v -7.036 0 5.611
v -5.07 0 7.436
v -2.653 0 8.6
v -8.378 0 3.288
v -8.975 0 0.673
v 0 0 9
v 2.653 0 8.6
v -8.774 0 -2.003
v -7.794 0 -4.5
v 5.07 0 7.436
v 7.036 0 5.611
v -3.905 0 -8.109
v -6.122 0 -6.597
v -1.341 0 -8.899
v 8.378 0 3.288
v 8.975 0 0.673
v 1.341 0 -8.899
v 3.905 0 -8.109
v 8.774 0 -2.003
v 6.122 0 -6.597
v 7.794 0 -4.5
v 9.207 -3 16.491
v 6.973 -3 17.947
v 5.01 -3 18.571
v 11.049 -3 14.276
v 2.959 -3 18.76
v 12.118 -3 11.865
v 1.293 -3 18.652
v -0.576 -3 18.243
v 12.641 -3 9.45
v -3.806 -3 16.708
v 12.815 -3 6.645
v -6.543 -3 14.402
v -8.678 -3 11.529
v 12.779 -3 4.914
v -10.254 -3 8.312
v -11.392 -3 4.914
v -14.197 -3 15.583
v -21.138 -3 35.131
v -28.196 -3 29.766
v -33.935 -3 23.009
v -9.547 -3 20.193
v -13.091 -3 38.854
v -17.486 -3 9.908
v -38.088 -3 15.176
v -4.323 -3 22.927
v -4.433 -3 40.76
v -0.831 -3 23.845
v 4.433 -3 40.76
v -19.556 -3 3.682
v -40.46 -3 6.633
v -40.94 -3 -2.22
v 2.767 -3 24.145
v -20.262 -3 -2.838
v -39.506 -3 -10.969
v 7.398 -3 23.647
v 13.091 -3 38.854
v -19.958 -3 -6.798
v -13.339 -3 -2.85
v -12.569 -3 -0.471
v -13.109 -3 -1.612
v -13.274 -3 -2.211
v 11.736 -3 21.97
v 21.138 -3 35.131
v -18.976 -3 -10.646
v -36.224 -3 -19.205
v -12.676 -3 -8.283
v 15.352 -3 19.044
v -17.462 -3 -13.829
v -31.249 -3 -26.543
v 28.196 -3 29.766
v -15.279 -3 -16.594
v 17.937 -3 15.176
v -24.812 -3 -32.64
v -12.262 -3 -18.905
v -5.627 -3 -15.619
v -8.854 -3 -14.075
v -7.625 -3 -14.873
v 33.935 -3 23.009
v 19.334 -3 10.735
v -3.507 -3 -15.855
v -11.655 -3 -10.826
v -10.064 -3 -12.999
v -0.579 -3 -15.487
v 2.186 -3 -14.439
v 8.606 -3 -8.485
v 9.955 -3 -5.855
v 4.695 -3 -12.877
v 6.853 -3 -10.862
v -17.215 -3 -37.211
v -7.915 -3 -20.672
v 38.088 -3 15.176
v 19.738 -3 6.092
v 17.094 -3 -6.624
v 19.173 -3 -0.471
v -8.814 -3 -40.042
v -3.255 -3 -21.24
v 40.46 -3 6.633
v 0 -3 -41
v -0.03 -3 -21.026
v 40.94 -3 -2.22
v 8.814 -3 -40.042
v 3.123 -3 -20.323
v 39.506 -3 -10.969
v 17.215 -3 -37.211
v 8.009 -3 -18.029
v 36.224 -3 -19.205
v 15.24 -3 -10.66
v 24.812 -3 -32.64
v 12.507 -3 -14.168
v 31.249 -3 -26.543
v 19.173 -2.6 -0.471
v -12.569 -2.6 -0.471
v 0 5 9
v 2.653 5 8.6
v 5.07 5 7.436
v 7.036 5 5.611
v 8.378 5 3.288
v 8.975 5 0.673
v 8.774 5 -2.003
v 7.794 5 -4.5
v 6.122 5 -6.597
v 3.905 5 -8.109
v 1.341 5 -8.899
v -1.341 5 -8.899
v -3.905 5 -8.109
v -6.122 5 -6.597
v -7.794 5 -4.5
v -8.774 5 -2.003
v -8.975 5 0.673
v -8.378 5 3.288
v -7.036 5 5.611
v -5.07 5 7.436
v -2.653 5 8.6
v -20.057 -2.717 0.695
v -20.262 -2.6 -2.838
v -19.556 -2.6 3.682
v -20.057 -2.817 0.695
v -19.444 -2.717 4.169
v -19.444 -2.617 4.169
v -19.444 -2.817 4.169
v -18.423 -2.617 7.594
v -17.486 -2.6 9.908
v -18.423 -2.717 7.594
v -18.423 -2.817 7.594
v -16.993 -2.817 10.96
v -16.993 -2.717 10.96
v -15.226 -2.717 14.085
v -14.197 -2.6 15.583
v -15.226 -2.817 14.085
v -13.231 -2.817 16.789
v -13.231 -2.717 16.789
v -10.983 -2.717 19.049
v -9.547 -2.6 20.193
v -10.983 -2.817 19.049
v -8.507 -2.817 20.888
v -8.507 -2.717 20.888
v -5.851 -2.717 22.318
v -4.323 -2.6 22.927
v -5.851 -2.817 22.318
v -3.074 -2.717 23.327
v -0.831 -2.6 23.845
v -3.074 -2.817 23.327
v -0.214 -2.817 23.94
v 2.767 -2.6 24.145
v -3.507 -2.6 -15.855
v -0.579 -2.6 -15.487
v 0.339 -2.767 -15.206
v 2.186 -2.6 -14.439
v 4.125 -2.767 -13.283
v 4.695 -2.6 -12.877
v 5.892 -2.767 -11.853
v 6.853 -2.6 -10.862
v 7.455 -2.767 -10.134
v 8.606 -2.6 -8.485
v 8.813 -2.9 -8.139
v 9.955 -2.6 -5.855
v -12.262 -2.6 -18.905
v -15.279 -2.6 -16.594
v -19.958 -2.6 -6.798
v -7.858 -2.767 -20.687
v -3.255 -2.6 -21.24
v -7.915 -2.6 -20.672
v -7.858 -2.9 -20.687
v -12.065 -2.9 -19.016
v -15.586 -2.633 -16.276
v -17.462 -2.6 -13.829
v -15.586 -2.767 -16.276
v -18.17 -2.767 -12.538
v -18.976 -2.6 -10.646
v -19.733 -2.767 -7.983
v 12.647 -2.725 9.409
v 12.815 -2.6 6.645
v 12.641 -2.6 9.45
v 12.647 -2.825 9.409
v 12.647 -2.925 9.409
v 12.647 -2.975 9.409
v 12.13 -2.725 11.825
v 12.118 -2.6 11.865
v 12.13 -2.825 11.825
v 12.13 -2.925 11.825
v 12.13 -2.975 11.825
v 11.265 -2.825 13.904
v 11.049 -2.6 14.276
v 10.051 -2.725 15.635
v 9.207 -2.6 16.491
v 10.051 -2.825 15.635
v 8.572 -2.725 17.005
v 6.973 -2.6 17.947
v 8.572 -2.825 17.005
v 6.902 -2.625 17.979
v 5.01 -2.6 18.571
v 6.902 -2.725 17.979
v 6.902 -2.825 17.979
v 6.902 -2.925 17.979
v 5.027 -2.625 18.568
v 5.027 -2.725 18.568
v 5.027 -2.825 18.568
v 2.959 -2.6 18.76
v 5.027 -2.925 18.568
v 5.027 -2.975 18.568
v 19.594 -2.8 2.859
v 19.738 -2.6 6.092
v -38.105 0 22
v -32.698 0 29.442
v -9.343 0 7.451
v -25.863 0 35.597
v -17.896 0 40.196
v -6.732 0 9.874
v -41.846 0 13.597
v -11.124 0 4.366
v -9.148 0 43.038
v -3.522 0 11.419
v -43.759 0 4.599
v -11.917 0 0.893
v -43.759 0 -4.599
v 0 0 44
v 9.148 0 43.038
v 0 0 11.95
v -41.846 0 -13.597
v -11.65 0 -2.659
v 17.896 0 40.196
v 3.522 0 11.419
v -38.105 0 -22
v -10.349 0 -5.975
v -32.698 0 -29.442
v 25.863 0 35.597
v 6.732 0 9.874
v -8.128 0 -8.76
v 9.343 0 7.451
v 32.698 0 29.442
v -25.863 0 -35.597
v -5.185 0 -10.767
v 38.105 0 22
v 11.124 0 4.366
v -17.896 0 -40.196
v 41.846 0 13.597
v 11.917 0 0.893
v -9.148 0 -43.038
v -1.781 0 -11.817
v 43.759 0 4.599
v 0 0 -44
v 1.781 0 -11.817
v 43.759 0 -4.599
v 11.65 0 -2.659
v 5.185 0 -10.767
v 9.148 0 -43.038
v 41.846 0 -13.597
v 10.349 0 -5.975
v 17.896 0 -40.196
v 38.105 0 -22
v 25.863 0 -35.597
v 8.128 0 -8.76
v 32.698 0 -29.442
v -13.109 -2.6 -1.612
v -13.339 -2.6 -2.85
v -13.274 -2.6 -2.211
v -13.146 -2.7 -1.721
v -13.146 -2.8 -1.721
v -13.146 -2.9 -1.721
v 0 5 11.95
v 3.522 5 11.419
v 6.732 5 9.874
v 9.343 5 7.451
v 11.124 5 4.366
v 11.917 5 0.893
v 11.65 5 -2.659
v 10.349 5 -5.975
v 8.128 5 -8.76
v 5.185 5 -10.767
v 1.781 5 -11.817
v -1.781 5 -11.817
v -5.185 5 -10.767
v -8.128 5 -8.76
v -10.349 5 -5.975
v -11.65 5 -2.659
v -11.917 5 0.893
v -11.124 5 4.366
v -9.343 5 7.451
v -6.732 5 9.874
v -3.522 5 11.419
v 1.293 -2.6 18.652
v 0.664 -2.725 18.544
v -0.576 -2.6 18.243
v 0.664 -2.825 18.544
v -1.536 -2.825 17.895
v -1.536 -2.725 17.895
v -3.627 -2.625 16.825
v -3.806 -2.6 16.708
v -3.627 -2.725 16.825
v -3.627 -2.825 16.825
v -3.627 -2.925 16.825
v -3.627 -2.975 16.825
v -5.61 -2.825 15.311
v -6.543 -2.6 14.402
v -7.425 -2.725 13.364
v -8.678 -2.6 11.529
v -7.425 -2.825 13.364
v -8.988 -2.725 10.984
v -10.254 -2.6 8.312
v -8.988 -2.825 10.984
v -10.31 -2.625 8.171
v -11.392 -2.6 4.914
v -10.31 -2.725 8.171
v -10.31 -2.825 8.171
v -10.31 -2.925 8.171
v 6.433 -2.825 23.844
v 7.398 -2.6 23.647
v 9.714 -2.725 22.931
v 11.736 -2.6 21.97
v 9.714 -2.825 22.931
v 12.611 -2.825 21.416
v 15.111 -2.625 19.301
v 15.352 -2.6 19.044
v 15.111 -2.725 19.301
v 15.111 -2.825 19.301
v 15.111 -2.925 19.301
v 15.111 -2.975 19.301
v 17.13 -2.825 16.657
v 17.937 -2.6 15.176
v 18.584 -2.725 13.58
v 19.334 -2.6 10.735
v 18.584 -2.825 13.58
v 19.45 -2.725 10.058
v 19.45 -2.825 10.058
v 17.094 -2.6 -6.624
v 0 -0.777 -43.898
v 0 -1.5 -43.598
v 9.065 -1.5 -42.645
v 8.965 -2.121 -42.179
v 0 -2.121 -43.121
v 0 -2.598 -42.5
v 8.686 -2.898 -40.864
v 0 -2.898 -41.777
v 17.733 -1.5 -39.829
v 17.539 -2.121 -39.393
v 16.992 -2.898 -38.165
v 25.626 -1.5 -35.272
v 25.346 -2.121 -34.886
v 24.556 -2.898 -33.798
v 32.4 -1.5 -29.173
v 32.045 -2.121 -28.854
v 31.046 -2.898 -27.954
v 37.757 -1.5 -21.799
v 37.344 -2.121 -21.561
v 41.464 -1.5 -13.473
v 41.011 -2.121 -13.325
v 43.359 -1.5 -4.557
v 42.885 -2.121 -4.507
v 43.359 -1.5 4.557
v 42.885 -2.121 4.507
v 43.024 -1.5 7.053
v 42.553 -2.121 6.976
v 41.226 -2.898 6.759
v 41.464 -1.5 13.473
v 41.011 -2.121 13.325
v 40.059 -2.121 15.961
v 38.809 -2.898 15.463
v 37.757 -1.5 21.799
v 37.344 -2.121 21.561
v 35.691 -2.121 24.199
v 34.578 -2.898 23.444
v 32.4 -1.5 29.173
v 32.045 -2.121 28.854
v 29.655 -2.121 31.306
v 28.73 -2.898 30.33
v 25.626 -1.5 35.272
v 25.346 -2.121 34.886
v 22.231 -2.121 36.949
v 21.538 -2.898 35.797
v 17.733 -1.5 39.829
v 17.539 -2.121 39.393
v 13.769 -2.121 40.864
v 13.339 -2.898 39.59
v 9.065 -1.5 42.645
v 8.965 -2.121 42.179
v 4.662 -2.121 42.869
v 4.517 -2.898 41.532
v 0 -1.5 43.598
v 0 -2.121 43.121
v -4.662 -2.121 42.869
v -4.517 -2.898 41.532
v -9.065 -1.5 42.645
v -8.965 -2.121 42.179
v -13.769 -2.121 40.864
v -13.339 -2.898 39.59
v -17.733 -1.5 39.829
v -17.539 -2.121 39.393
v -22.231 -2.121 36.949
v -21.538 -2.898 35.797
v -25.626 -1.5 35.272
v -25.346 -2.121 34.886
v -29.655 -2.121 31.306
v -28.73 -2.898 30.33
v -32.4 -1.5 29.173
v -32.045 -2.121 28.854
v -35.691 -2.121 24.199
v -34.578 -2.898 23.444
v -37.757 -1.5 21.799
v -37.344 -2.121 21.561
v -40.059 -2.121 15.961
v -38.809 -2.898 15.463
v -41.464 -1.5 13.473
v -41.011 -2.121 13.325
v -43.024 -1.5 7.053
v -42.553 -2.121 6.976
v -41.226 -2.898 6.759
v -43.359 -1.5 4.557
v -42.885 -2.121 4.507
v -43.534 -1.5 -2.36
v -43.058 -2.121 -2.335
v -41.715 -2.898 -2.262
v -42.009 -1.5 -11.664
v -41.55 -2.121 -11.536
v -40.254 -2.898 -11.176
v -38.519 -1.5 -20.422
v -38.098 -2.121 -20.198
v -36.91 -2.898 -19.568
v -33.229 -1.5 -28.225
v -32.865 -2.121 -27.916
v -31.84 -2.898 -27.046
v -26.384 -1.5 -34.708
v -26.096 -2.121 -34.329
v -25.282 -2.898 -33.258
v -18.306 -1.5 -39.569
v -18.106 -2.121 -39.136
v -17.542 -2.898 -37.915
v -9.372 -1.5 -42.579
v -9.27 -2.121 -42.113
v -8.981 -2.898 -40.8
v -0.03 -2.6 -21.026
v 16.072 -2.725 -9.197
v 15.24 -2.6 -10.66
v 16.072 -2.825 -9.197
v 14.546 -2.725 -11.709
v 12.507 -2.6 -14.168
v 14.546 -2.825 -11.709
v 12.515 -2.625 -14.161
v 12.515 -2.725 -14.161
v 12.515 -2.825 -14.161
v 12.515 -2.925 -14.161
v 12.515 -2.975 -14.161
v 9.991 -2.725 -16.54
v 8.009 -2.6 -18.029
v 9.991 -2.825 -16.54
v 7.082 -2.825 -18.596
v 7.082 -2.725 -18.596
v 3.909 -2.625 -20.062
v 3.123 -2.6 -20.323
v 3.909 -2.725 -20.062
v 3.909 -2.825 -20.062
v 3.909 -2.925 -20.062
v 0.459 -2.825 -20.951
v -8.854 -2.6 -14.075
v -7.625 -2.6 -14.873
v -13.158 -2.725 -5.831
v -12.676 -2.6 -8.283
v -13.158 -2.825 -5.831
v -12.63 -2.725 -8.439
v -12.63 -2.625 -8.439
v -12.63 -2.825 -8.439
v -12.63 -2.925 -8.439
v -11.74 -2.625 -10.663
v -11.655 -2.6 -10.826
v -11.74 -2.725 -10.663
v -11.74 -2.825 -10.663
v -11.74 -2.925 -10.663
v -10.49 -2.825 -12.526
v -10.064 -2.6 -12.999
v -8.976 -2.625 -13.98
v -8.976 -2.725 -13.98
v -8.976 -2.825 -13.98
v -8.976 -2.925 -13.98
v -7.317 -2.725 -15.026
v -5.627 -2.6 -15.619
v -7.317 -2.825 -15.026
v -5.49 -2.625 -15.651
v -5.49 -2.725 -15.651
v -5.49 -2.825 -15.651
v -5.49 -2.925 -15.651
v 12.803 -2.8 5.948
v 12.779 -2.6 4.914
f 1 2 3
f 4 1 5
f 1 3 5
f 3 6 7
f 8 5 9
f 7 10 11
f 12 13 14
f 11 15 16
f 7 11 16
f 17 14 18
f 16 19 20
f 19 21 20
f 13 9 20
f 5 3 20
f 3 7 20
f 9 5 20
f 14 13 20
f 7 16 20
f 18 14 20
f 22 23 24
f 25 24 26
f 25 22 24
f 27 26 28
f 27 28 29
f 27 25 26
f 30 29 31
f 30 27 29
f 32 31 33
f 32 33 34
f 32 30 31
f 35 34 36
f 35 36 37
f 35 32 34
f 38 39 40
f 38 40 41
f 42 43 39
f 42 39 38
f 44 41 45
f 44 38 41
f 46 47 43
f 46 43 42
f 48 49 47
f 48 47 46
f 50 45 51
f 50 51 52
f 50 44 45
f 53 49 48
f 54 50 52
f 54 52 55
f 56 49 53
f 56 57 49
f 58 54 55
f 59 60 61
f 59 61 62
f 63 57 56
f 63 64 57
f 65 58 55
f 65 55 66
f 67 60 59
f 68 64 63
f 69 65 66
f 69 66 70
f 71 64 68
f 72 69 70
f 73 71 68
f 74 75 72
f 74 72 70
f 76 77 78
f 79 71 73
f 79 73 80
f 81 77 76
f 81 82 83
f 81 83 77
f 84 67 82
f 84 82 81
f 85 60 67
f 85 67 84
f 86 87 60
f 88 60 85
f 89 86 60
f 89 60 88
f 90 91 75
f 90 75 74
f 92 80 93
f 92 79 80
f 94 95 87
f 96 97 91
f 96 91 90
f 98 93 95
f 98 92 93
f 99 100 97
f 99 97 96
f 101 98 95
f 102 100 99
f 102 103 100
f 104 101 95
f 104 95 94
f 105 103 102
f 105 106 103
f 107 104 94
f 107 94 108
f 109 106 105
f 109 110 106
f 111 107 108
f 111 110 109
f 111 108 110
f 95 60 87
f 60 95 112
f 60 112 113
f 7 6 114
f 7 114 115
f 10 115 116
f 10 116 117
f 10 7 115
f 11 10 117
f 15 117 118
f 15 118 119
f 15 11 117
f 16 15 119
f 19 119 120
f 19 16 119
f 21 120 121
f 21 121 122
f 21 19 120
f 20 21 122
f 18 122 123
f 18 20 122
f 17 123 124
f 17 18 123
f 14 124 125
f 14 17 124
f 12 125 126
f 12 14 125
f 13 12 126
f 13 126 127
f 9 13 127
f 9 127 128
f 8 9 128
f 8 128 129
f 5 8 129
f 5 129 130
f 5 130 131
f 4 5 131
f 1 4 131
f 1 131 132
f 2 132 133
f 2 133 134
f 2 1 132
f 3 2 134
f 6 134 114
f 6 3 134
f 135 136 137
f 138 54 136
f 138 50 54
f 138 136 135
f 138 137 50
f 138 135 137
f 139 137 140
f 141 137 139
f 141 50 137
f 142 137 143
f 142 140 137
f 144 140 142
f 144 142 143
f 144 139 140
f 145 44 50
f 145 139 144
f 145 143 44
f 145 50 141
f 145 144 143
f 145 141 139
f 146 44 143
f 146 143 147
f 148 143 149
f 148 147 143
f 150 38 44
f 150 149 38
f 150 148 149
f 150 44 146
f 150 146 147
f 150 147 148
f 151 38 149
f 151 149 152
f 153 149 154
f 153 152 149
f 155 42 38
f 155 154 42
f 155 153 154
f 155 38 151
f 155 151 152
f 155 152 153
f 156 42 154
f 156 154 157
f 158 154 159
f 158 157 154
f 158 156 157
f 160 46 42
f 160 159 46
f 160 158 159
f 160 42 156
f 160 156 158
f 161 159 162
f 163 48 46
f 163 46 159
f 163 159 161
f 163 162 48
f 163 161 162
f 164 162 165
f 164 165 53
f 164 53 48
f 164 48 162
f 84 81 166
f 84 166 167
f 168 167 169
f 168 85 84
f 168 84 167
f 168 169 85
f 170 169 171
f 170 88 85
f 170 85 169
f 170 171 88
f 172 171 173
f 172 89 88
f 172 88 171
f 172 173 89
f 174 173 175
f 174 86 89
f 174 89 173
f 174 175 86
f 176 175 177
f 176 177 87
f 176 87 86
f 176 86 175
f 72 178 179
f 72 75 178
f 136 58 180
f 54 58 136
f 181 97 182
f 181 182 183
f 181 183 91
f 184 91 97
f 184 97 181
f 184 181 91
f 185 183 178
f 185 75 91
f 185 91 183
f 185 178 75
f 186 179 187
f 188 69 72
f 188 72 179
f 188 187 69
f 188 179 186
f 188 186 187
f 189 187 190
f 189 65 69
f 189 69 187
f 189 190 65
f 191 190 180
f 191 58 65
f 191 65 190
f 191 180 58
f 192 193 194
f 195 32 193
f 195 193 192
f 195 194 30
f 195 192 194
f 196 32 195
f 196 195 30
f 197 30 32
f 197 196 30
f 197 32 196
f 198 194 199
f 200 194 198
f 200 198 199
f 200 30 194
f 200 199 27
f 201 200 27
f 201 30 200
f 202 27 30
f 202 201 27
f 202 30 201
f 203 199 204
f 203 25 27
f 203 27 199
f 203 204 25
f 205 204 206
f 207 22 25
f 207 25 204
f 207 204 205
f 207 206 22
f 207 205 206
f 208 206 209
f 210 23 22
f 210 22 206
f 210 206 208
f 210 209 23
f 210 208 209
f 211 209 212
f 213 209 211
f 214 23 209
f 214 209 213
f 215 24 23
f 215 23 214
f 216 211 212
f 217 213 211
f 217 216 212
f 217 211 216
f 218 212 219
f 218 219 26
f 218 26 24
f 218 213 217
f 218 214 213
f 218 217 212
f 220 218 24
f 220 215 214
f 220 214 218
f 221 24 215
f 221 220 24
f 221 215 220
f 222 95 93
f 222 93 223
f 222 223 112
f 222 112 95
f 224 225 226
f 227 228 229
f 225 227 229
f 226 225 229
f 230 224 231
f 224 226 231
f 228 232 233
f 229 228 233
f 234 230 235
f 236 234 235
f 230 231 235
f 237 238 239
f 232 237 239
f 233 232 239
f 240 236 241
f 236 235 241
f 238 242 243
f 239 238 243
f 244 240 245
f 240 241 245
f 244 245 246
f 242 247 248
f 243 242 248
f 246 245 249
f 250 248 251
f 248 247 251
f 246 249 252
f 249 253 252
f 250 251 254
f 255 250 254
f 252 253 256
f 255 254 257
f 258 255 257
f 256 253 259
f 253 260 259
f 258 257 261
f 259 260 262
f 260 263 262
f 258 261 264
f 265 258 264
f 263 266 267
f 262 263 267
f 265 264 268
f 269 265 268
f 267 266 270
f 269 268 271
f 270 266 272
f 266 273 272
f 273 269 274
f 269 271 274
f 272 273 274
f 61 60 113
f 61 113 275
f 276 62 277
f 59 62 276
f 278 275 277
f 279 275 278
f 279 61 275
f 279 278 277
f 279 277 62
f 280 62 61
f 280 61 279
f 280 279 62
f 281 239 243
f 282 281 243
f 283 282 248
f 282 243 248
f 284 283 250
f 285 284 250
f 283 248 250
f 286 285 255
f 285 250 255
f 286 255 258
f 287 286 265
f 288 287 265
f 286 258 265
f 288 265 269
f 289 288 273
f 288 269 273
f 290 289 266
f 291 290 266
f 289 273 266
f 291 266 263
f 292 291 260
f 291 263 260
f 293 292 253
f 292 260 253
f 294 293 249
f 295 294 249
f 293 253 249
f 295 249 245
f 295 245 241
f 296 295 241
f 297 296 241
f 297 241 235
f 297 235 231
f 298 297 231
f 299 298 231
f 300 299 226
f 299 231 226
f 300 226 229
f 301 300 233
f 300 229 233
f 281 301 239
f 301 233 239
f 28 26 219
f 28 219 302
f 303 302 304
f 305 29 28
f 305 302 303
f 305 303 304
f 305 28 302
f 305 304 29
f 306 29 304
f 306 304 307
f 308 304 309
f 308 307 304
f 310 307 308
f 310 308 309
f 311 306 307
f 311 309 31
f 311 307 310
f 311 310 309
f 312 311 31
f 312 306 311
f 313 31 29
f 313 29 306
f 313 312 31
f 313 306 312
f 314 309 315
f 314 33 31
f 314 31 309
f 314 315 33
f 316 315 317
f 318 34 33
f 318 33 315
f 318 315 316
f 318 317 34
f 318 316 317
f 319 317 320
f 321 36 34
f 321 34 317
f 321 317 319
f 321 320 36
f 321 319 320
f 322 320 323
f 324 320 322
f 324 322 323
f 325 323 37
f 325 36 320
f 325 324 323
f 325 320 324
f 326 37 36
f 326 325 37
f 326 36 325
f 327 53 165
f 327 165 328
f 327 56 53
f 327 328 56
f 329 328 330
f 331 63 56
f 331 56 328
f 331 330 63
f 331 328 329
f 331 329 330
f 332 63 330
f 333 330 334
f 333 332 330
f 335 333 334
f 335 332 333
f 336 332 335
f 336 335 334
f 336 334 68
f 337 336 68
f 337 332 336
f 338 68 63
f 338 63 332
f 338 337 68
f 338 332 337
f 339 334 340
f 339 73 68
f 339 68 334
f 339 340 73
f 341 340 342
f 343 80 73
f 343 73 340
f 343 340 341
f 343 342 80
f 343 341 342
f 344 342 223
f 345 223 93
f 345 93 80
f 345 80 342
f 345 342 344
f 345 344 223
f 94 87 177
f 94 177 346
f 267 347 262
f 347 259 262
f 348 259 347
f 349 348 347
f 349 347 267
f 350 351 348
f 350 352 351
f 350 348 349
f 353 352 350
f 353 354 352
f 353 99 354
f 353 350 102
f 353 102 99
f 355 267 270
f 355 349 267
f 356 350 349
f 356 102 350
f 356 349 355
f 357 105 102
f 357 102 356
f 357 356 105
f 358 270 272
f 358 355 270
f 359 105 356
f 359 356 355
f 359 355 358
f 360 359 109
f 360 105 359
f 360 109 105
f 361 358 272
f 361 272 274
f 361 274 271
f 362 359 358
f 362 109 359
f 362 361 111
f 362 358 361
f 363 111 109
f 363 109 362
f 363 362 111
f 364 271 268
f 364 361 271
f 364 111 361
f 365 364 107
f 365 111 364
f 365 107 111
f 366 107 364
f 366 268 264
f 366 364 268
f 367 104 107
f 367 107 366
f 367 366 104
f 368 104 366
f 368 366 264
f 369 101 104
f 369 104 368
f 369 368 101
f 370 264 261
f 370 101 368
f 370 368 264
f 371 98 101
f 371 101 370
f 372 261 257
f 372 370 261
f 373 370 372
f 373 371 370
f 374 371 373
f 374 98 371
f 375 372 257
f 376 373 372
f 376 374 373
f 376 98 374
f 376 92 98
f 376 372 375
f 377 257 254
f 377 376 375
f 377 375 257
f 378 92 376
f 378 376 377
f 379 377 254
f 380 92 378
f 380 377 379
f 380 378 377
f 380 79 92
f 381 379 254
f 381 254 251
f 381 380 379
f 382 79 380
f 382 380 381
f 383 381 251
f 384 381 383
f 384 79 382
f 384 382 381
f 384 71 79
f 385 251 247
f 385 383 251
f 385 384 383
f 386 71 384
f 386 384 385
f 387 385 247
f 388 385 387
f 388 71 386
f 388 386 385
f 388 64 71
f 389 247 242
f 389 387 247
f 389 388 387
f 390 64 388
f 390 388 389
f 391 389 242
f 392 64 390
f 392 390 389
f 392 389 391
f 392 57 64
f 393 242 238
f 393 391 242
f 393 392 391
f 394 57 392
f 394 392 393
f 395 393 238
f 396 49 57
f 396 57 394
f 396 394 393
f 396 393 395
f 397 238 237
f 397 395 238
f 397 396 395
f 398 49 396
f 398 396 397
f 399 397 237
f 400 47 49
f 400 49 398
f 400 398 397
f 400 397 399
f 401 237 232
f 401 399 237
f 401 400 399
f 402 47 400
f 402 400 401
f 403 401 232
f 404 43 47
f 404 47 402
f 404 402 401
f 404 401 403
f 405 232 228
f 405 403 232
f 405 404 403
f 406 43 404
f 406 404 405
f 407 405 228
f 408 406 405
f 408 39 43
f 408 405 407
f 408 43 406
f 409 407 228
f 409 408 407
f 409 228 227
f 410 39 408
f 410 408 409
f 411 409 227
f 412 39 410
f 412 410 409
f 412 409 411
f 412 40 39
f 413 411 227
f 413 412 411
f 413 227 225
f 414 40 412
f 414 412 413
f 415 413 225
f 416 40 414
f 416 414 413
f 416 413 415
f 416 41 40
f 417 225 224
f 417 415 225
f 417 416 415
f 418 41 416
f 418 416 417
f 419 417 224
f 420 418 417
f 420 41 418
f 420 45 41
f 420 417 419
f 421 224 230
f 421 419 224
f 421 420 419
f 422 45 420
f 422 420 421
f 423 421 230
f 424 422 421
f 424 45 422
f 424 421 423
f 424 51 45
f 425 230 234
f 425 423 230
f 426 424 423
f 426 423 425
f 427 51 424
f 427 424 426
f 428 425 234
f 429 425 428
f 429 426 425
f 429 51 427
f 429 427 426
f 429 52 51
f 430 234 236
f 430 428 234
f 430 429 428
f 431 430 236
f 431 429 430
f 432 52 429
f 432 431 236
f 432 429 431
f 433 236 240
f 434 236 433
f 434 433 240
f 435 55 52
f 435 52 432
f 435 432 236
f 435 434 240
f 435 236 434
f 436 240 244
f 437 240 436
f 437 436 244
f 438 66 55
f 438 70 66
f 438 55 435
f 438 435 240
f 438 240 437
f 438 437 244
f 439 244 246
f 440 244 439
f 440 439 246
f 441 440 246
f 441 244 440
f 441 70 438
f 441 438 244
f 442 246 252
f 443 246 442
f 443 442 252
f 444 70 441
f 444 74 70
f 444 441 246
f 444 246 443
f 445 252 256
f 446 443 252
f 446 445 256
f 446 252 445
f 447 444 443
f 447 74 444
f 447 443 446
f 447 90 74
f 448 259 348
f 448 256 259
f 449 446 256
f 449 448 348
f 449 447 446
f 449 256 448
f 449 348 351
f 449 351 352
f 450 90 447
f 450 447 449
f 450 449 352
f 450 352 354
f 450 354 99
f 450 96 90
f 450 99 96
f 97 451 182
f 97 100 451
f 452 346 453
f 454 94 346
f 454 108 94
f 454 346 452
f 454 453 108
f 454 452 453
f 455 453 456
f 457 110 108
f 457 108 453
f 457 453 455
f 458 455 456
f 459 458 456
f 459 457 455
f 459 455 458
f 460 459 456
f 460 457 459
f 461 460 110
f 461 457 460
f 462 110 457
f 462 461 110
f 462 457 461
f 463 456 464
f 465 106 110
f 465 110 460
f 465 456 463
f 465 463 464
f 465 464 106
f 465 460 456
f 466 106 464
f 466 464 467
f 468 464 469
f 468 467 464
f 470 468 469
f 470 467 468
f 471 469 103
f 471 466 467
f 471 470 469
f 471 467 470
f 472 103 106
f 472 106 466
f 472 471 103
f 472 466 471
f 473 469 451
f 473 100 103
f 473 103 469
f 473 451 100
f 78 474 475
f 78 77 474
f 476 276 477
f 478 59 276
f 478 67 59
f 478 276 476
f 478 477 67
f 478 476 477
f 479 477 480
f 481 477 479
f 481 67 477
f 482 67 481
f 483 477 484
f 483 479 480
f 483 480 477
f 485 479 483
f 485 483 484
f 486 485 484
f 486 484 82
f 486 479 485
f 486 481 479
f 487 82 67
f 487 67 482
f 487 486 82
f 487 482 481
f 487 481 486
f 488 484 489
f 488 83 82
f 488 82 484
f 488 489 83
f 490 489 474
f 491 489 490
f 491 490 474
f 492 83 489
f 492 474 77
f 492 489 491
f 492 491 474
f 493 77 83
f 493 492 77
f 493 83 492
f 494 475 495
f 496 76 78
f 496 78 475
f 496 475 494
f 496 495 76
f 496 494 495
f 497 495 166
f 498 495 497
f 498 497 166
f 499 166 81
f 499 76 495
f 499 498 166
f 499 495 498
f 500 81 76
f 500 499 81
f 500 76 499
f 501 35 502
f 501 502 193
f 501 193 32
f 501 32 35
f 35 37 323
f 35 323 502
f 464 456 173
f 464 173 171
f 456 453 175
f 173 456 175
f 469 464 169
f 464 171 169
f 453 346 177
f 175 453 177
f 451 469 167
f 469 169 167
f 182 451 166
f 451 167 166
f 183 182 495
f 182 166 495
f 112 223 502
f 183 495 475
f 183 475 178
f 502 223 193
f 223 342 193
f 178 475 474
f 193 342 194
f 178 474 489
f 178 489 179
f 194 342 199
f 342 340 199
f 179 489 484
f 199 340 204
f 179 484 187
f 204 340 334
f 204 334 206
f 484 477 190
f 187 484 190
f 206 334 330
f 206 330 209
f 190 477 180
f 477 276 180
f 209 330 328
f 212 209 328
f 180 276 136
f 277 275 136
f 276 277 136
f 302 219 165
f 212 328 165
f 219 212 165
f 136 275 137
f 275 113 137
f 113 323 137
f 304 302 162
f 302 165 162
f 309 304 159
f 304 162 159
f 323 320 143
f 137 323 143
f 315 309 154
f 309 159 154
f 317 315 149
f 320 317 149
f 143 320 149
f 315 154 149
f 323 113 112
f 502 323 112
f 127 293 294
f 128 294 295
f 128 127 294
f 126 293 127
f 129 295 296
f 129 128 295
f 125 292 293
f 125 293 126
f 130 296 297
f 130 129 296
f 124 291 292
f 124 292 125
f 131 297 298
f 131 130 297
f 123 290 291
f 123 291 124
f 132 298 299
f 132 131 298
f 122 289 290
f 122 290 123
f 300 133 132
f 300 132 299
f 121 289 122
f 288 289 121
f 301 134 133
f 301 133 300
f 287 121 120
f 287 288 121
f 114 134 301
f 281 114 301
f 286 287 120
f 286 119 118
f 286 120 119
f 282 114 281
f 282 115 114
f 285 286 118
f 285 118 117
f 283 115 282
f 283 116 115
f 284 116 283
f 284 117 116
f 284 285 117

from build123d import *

# Parameters (mm, degrees)
SKETCH_1_R          = 11.95
SKETCH_1_R_2        = 9
EXTRUDE_1_DEPTH     = 5
SKETCH_2_R          = 44
EXTRUDE_2_DEPTH     = 3
FILLET_1_R          = 3
CUT_EXTRUDE_1_DEPTH = 0.4


with BuildPart() as part:
    # Эскиз1 → Бобышка-Вытянуть1 (new body)
    with BuildSketch(Plane(origin=(0, 0, 0), x_dir=(1, 0, 0), z_dir=(0, 1, 0))):
        with Locations(Location((0, 0, 0), (0, 0, 270))):
            Circle(SKETCH_1_R)
        with Locations(Location((0, 0, 0), (0, 0, 270))):
            Circle(SKETCH_1_R_2, mode=Mode.SUBTRACT)
    extrude(amount=EXTRUDE_1_DEPTH)

    # Эскиз2 → Бобышка-Вытянуть2 (add)
    with BuildSketch(Plane.XZ):
        with Locations(Location((0, 0, 0), (0, 0, 270))):
            Circle(SKETCH_2_R)
    extrude(amount=EXTRUDE_2_DEPTH)

    # Скругление1
    fillet_1_edges = [part.edges().sort_by_distance(p)[0] for p in [
        (0, -3, 44),
    ]]
    fillet(fillet_1_edges, radius=FILLET_1_R - 0.0001)  # a hair under: the kernel refuses the full size

    # Эскиз3 → Вырез-Вытянуть1 (cut)
    with BuildSketch(Plane.XZ.offset(3)):
        with BuildLine():
            Line((9.954559223, -5.855217729), (17.0939823, -6.624448498))
            add(Edge.make_bspline(
                [(17.0939823, -6.624448498), (16.954374573, -7.060364037), (16.67246957, -7.940593052), (16.082570182, -9.220685029), (15.367854468, -10.479237732), (14.549468275, -11.738227045), (13.598128393, -12.976714181), (12.508174471, -14.188327514), (11.307260102, -15.391109491), (9.994571436, -16.559013497), (8.599176625, -17.665541174), (7.097641414, -18.617186253), (5.53477836, -19.420340753), (3.908983058, -20.092788159), (2.213013482, -20.604345047), (0.449135236, -20.981542054), (-1.382110347, -21.198678471), (-2.625007466, -21.22599593), (-3.254575393, -21.239833113)],
                knots=[0, 0, 0, 0, 0.821440156, 1.658705401, 2.525323128, 3.419405186, 4.353419828, 5.32681938, 6.344399772, 7.404443113, 8.481060479, 9.538977106, 10.591299887, 11.633537695, 12.694215778, 13.768160887, 14.869500701, 16, 16, 16, 16], degree=3))
            add(Edge.make_bspline(
                [(-3.254575393, -21.239833113), (-4.037474252, -21.210468003), (-5.585963904, -21.152386976), (-7.859698842, -20.739484748), (-10.031214503, -20.033002378), (-12.082905697, -19.06267493), (-13.983263507, -17.838479622), (-15.628310659, -16.302835445), (-17.068788245, -14.551786811), (-18.226388665, -12.538555624), (-19.140015512, -10.335429034), (-19.780294703, -7.963227163), (-20.191471581, -5.448805692), (-20.238000287, -3.721455618), (-20.261786931, -2.838390806)],
                knots=[0, 0, 0, 0, 0.998551589, 1.975027533, 2.936744805, 3.903838964, 4.863557655, 5.807675034, 6.763178998, 7.745855275, 8.758641806, 9.797744155, 10.874151411, 12, 12, 12, 12], degree=3))
            add(Edge.make_bspline(
                [(-20.261786931, -2.838390806), (-20.253583862, -2.249072754), (-20.237148757, -1.068355571), (-20.071493014, 0.692734171), (-19.824593654, 2.443807008), (-19.457520681, 4.175543157), (-19.00443369, 5.89924412), (-18.436371871, 7.60283942), (-17.771918435, 9.296625216), (-17.009212067, 10.961487215), (-16.169576767, 12.570831605), (-15.246119859, 14.076076683), (-14.290825473, 15.491991281), (-13.257769645, 16.789715189), (-12.155533796, 17.973523587), (-11.00356969, 19.054320976), (-9.797035153, 20.040082521), (-8.518689542, 20.899962793), (-7.204489818, 21.664382583), (-5.862524589, 22.334760878), (-4.485868659, 22.886891815), (-3.083314583, 23.339978114), (-1.660006861, 23.708336607), (-0.208394214, 23.955377865), (1.268817222, 24.120842874), (2.265803014, 24.136773037), (2.767059223, 24.144782271)],
                knots=[0, 0, 0, 0, 1.075906032, 2.155611451, 3.227554832, 4.30373447, 5.38628686, 6.480642286, 7.581143633, 8.707391042, 9.82337293, 10.893692135, 11.930684225, 12.940768785, 13.919223559, 14.881988069, 15.823529777, 16.761054785, 17.692163021, 18.598508727, 19.497917784, 20.397951545, 21.288749041, 22.180057169, 23.084984307, 24, 24, 24, 24], degree=3))
            add(Edge.make_bspline(
                [(2.767059223, 24.144782271), (3.396819449, 24.13271298), (4.624674455, 24.109181262), (6.419415658, 23.873617188), (8.114533072, 23.493780483), (9.71479097, 22.957293415), (11.228369978, 22.293366902), (12.626669407, 21.438368521), (13.932702912, 20.448929523), (15.134462193, 19.318054618), (16.221199996, 18.057248477), (17.152473609, 16.665333162), (17.973572218, 15.181251724), (18.615932964, 13.571276078), (19.12246379, 11.857059969), (19.479861685, 10.030309351), (19.69885311, 8.096457894), (19.72490677, 6.769573083), (19.738213069, 6.091897656)],
                knots=[0, 0, 0, 0, 1.079196217, 2.10412856, 3.097265039, 4.052997914, 4.993829394, 5.924450447, 6.855882321, 7.798592485, 8.748507102, 9.702980304, 10.665060364, 11.651045023, 12.668191174, 13.725659051, 14.838433479, 16, 16, 16, 16], degree=3))
            add(Edge.make_bspline(
                [(19.738213069, 6.091897656), (19.711530906, 5.012347464), (19.657182115, 2.813415932), (19.336536232, 0.637210246), (19.173309223, -0.470602344)],
                knots=[0, 0, 0, 0, 0.981886135, 2, 2, 2, 2], degree=3))
            Line((19.173309223, -0.470602344), (-12.569479239, -0.470602344))
            add(Edge.make_bspline(
                [(-12.569479239, -0.470602344), (-12.686010265, -0.684825825), (-12.905708031, -1.088704703), (-13.155238164, -1.702843602), (-13.305966259, -2.286193686), (-13.328203982, -2.669377879), (-13.338710008, -2.850410037)],
                knots=[0, 0, 0, 0, 1.156942796, 2.181202349, 3.140724307, 4, 4, 4, 4], degree=3))
            add(Edge.make_bspline(
                [(-13.338710008, -2.850410037), (-13.329201362, -3.363533664), (-13.310745354, -4.359491854), (-13.176596758, -5.804983514), (-12.964076928, -7.159922166), (-12.658814238, -8.421765438), (-12.240072534, -9.58253052), (-11.763714111, -10.662876848), (-11.191471954, -11.653246376), (-10.509245809, -12.527103519), (-9.781157621, -13.313071224), (-8.993901514, -13.981427574), (-8.186858669, -14.571826363), (-7.326503521, -15.044385035), (-6.422970918, -15.399496847), (-5.487224957, -15.67198157), (-4.510031445, -15.830569123), (-3.844080664, -15.846933933), (-3.506979239, -15.855217729)],
                knots=[0, 0, 0, 0, 1.346284225, 2.613098929, 3.805631801, 4.942804233, 6.013450698, 7.039235158, 8.038108926, 9.00533571, 9.942442562, 10.84439418, 11.710848438, 12.56244313, 13.41163356, 14.253504373, 15.115931414, 16, 16, 16, 16], degree=3))
            add(Edge.make_bspline(
                [(-3.506979239, -15.855217729), (-2.858509214, -15.827358464), (-1.550821401, -15.771178193), (0.380315515, -15.234581986), (2.305705802, -14.442665665), (3.842751413, -13.498748209), (5.053499235, -12.625146746), (5.900225032, -11.858088786), (6.717542295, -11.040465602), (7.465873942, -10.135485129), (8.183042091, -9.175321866), (8.828146274, -8.133230752), (9.436128603, -7.030114624), (9.780061437, -6.250674515), (9.954559223, -5.855217729)],
                knots=[0, 0, 0, 0, 1.313044299, 2.647851039, 4.03980324, 5.527339259, 6.29475363, 7.066375866, 7.842396062, 8.63863277, 9.446691243, 10.272184996, 11.123375662, 12, 12, 12, 12], degree=3))
        make_face()
        with BuildLine():
            Line((-11.391594623, 4.91401304), (12.779078454, 4.91401304))
            add(Edge.make_bspline(
                [(12.779078454, 4.91401304), (12.787709895, 5.258551796), (12.802161832, 5.835425615), (12.811411041, 6.41240478), (12.815136146, 6.644782271)],
                knots=[0, 0, 0, 0, 1.194503009, 2, 2, 2, 2], degree=3))
            add(Edge.make_bspline(
                [(12.815136146, 6.644782271), (12.803898897, 7.117699119), (12.781959502, 8.041013127), (12.670145666, 9.384414471), (12.449186915, 10.640968329), (12.156588483, 11.815328923), (11.751690213, 12.896198212), (11.293094857, 13.905101329), (10.71543559, 14.812813231), (10.071782115, 15.638694593), (9.359494816, 16.377148538), (8.592848863, 17.01350722), (7.772383486, 17.549245443), (6.910455487, 17.999648964), (5.985412837, 18.329941166), (5.022728372, 18.590023931), (4.005305708, 18.732775986), (3.312338023, 18.750923328), (2.959366915, 18.760166887)],
                knots=[0, 0, 0, 0, 1.288915635, 2.516454775, 3.668675548, 4.762204166, 5.808675246, 6.809806692, 7.776046417, 8.732555008, 9.659000055, 10.566141369, 11.441184925, 12.324901883, 13.209090714, 14.112018255, 15.038334656, 16, 16, 16, 16], degree=3))
            add(Edge.make_bspline(
                [(2.959366915, 18.760166887), (2.569950261, 18.753640128), (1.799322271, 18.740724135), (0.659341059, 18.554273421), (-0.460843427, 18.303647562), (-1.545658439, 17.905847871), (-2.609502644, 17.425759439), (-3.649545731, 16.838318089), (-4.643906234, 16.113950662), (-5.632504092, 15.317947338), (-6.575317711, 14.401029882), (-7.44471318, 13.362562561), (-8.275005659, 12.230615841), (-9.006135858, 10.970703852), (-9.718002889, 9.624439846), (-10.328585973, 8.148804352), (-10.917153248, 6.578634088), (-11.231013188, 5.477427724), (-11.391594623, 4.91401304)],
                knots=[0, 0, 0, 0, 0.867869597, 1.717452491, 2.571772394, 3.425671253, 4.289803496, 5.174634535, 6.084973587, 7.031591473, 8.005136717, 9.013559597, 10.050697067, 11.133079613, 12.260592687, 13.446148552, 14.693362615, 16, 16, 16, 16], degree=3))
        make_face(mode=Mode.SUBTRACT)
    extrude(amount=-CUT_EXTRUDE_1_DEPTH, mode=Mode.SUBTRACT)


solid = part.part
